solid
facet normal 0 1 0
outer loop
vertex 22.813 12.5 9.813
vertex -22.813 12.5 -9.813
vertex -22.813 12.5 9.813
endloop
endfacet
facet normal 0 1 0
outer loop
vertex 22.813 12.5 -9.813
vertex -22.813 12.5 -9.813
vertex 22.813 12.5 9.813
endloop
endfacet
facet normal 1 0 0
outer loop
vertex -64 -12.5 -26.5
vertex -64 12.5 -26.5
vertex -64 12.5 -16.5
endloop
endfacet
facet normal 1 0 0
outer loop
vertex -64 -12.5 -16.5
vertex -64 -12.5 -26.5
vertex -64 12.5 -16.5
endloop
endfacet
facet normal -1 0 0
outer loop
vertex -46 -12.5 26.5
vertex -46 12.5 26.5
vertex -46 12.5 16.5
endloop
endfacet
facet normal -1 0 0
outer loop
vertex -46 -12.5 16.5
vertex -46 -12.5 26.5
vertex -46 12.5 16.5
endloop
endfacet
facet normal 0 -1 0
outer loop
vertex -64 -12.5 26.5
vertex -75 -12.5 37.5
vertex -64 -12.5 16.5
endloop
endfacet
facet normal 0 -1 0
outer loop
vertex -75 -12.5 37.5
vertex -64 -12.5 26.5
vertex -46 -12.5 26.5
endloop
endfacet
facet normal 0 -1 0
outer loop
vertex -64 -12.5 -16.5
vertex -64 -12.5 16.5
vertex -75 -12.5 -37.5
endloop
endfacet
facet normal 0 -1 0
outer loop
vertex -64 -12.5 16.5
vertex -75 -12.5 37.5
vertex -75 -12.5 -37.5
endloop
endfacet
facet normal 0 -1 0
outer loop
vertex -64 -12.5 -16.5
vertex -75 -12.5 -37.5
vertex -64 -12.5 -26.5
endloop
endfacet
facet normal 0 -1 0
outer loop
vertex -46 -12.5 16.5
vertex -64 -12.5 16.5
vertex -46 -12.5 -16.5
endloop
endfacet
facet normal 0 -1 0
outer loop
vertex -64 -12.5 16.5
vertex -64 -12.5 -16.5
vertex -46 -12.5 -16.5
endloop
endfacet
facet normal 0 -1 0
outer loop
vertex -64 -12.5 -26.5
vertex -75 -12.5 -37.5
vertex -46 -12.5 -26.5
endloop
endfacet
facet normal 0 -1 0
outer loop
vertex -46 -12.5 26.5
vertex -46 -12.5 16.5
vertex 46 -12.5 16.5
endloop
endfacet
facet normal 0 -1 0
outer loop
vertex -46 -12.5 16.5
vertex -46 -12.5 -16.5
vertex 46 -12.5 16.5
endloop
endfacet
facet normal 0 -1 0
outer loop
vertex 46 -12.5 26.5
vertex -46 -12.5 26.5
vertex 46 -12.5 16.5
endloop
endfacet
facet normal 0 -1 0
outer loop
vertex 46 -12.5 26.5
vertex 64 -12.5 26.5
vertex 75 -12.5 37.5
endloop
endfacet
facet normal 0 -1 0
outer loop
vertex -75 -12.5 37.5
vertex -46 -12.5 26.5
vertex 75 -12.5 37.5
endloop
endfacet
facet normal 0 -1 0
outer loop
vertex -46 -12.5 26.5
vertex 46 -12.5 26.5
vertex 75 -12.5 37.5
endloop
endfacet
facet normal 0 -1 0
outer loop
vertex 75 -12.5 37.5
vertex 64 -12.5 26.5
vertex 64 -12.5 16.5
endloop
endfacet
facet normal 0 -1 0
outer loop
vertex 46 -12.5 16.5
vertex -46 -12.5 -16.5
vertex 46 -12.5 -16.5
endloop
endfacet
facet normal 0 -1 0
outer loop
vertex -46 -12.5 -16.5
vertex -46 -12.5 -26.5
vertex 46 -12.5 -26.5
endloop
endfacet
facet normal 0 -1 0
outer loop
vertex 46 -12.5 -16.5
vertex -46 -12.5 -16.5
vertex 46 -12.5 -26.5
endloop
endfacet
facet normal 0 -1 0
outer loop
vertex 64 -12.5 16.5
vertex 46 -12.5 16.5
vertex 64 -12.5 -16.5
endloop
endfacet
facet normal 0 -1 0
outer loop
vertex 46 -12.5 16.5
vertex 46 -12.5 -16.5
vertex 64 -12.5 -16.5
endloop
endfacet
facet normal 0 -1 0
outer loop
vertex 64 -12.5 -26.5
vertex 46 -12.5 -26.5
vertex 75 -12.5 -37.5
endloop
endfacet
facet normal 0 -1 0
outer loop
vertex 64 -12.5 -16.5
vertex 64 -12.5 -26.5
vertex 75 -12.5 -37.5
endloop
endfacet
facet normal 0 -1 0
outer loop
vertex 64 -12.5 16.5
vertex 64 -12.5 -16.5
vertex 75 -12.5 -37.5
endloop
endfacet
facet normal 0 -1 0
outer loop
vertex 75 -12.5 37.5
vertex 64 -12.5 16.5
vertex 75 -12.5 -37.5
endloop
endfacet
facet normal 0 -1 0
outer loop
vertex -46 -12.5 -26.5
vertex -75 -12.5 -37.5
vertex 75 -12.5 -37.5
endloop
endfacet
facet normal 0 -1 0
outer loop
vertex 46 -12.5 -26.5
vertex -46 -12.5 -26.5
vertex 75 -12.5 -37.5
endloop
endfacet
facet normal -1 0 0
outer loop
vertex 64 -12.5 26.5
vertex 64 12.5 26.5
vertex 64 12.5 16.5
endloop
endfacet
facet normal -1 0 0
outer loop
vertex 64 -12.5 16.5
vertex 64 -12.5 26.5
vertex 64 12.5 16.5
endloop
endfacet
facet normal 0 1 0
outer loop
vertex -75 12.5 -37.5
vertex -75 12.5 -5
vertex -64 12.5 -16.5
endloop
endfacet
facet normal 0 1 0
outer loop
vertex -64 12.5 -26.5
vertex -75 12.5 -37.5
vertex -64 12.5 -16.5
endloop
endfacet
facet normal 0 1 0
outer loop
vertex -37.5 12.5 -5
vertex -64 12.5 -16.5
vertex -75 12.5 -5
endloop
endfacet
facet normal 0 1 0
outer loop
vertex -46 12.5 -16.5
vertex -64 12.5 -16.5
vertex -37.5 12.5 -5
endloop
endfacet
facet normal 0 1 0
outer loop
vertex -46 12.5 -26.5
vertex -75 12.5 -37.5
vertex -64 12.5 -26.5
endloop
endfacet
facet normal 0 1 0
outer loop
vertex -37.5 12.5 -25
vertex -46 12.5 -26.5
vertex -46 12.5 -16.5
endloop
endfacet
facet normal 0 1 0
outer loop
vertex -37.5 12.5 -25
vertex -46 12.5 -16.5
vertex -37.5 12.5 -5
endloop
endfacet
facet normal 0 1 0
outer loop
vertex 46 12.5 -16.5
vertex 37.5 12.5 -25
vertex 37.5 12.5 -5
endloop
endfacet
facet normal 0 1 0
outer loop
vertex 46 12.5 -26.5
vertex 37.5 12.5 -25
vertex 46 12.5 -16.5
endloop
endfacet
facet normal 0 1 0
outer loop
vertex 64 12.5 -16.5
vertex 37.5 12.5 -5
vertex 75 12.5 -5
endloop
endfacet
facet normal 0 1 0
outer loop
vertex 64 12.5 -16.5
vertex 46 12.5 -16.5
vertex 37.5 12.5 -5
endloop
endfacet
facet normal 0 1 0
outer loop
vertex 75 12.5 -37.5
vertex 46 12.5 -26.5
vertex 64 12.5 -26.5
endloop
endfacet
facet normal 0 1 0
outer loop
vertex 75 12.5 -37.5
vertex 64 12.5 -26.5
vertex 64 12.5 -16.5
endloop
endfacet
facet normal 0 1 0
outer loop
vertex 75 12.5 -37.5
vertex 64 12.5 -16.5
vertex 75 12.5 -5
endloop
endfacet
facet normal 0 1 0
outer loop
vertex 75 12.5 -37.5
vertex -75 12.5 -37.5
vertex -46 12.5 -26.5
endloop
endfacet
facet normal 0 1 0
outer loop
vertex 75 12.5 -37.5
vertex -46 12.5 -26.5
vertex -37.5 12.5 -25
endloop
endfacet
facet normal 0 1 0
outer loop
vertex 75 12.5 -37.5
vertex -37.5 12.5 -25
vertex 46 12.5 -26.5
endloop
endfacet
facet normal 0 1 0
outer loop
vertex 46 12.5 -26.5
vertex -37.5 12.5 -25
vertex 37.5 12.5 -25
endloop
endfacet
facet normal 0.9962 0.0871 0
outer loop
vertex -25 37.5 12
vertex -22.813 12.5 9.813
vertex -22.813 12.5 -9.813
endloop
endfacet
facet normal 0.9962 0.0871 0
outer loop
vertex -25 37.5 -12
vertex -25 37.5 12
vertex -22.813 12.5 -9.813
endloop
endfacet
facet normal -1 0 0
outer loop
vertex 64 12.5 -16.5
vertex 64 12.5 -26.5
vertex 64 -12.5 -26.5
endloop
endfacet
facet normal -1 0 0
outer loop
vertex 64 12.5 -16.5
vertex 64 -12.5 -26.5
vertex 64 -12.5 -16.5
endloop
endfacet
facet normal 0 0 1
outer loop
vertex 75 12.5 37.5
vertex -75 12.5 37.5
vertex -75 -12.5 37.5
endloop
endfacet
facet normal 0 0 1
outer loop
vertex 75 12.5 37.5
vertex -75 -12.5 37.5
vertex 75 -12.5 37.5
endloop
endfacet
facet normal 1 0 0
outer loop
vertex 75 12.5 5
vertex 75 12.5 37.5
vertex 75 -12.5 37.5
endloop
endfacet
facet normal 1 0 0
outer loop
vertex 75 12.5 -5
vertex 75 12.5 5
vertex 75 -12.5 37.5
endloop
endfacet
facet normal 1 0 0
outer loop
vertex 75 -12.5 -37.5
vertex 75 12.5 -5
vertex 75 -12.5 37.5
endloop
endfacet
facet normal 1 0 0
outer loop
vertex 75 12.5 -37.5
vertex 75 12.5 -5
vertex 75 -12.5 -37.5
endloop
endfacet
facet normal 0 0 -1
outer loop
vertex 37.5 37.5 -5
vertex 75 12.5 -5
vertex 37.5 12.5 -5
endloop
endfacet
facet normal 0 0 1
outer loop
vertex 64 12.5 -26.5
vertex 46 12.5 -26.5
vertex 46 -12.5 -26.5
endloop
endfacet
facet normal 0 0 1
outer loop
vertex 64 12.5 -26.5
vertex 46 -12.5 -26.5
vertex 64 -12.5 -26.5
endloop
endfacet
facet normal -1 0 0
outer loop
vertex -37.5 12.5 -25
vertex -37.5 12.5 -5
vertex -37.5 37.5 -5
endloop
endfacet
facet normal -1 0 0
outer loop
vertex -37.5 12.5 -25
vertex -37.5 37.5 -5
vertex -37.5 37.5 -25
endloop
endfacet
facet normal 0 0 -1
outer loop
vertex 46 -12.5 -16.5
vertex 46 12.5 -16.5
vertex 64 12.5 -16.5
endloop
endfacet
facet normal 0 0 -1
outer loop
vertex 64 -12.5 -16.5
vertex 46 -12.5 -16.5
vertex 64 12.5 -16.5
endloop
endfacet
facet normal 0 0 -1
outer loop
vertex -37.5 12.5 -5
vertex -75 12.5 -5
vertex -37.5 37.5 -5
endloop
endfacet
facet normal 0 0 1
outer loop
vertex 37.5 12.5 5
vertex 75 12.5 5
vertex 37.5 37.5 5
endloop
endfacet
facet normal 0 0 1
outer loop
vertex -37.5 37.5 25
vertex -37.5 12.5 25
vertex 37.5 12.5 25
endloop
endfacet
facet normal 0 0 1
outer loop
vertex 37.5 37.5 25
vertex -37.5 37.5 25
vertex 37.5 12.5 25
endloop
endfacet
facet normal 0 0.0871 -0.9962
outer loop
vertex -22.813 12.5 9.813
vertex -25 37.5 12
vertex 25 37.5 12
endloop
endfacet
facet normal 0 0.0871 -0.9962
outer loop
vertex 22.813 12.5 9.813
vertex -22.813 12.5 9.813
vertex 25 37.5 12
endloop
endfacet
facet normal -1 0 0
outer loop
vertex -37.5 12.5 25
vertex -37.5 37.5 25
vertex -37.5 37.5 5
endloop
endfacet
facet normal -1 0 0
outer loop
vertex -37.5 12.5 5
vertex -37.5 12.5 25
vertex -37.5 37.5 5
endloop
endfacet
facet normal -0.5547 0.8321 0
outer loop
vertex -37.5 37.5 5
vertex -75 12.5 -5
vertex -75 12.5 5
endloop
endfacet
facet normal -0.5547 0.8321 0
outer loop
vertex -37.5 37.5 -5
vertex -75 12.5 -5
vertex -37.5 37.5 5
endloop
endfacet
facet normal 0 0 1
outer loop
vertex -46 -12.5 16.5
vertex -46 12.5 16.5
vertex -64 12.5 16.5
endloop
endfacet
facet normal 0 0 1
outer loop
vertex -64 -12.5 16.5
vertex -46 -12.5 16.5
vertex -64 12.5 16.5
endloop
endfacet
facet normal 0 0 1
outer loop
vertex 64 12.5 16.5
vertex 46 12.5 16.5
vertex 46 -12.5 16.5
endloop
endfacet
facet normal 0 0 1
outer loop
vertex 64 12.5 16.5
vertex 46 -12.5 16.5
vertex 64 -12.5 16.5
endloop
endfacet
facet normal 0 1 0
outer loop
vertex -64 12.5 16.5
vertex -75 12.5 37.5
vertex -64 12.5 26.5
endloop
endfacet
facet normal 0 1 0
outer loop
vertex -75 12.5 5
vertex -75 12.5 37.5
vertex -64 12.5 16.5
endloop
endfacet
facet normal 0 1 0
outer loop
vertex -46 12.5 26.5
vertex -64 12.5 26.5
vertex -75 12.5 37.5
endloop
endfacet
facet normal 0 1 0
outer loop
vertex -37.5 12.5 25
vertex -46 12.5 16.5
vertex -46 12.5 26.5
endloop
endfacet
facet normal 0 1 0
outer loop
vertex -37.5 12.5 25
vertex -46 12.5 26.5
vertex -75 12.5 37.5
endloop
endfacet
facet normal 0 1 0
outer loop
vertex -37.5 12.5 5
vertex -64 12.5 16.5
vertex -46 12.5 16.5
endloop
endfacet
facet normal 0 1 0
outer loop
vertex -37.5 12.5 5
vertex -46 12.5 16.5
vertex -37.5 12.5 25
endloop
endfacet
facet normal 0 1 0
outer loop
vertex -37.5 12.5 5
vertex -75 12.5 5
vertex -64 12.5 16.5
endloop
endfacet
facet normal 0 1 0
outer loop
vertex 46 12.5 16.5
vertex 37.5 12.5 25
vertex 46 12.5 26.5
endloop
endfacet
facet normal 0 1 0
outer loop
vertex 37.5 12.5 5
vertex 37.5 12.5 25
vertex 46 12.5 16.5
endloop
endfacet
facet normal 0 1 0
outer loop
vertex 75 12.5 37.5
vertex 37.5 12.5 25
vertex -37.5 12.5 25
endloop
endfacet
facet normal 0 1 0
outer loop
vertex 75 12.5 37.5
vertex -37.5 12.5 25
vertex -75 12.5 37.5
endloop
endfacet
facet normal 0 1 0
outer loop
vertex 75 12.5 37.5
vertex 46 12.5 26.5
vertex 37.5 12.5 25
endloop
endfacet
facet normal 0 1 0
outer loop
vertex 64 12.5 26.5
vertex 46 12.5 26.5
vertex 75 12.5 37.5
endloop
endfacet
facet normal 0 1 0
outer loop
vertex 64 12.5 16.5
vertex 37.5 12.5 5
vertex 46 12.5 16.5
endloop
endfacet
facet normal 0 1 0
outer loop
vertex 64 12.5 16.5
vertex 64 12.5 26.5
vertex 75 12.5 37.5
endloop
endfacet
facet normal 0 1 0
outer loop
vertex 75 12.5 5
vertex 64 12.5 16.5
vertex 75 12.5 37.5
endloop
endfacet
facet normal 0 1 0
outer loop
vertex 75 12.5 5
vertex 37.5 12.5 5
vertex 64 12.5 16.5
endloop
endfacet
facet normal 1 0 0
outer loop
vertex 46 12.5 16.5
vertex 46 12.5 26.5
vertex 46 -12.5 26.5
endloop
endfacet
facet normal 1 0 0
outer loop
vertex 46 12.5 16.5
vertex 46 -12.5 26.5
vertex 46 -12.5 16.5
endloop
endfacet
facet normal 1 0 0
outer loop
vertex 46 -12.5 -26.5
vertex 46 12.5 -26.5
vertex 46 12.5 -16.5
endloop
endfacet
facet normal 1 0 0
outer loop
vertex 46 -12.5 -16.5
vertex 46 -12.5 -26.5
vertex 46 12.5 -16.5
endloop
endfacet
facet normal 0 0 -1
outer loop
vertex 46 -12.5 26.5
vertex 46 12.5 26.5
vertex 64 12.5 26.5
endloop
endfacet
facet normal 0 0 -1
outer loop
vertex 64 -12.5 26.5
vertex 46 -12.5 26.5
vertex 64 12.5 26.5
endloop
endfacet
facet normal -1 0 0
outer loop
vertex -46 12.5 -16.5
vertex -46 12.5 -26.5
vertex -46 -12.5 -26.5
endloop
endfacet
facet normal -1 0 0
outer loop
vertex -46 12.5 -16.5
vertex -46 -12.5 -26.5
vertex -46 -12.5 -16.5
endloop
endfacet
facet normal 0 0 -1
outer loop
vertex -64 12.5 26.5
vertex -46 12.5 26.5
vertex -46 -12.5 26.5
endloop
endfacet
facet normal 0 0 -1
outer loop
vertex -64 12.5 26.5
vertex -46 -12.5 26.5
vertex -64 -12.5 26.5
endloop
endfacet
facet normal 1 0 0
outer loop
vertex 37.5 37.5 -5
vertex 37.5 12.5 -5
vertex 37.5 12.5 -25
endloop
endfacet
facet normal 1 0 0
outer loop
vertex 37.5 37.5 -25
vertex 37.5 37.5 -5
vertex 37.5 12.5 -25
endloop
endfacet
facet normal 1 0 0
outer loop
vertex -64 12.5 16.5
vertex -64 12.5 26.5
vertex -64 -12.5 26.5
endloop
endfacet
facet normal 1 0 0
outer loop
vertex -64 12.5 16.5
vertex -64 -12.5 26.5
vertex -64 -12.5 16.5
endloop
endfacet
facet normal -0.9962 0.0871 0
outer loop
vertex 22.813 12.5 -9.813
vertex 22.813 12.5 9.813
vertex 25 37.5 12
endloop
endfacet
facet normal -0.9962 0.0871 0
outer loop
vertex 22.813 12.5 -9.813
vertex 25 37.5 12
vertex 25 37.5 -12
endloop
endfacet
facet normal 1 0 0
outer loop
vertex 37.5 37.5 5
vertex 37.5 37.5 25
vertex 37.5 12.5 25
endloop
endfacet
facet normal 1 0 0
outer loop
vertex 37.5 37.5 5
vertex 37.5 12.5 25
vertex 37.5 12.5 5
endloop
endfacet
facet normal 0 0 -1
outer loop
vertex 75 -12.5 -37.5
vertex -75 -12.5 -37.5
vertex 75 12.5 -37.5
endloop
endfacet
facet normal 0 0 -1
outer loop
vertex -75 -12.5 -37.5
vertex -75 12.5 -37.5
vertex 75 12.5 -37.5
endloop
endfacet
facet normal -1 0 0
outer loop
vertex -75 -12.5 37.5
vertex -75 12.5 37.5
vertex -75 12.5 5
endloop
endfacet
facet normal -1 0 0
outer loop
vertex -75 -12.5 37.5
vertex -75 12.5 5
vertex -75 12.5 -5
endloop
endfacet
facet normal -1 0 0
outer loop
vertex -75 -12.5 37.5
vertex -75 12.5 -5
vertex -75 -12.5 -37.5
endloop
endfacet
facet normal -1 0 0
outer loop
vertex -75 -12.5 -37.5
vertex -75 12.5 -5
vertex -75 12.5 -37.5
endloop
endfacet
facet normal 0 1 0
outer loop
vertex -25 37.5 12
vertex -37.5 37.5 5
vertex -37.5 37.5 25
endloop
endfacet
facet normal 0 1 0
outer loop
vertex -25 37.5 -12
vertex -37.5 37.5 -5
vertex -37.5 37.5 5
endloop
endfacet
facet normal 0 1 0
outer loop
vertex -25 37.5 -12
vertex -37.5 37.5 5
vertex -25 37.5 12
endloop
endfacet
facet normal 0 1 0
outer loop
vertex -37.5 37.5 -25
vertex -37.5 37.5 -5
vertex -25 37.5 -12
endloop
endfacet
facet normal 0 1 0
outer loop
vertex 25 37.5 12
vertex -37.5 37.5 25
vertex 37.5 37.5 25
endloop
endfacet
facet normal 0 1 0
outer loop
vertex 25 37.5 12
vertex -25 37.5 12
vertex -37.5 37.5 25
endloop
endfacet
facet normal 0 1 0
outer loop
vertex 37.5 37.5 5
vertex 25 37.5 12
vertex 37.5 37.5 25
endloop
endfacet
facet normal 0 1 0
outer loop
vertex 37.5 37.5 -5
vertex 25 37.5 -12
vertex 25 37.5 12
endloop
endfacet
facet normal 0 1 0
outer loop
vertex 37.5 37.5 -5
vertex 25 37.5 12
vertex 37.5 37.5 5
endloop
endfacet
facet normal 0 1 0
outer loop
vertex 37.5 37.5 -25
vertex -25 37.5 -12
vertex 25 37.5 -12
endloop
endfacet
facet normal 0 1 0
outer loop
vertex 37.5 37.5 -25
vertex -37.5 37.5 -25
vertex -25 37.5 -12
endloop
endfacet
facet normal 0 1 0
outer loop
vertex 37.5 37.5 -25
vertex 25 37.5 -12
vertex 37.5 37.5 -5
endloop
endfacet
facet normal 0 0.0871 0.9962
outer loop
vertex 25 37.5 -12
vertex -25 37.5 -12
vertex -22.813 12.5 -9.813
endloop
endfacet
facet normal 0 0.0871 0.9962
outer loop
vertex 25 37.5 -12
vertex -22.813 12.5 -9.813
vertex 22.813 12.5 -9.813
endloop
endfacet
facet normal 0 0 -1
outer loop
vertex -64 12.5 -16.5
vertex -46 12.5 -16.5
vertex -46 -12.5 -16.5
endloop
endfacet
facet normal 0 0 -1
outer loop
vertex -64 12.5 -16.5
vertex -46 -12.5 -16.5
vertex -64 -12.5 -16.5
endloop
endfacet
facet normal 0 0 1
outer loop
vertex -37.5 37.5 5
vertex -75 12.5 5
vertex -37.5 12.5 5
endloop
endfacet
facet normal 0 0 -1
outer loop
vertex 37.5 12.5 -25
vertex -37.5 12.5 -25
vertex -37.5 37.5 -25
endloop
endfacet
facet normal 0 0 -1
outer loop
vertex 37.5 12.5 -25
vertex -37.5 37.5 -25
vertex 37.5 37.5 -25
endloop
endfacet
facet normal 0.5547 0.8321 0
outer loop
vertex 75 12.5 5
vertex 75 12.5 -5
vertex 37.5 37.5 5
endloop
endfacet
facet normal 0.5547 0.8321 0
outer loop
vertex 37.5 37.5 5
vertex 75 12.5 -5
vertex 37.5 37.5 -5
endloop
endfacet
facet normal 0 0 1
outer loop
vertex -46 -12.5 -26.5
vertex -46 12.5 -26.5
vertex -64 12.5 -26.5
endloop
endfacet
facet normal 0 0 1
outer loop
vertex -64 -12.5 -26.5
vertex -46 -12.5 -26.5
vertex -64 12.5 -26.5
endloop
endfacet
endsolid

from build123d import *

# Parameters (mm, degrees)
SKETCH2_W               = 150
SKETCH2_H               = 75
BOSS_EXTRUDE1_DEPTH     = 12.5
SKETCH3_W               = 75
SKETCH3_H               = 50
BOSS_EXTRUDE3_DEPTH     = 25
SKETCH4_W               = 50
SKETCH4_H               = 24
CUT_EXTRUDE1_DEPTH      = 25
CUT_EXTRUDE1_DRAFT      = -5
SKETCH5_W               = 18
SKETCH5_H               = 10
CUT_EXTRUDE2_DEPTH      = 88.5
MIRROR2_COPY_1_SKETCH_W = 18
MIRROR2_COPY_1_SKETCH_H = 10
MIRROR2_COPY_1_DEPTH    = 88.5
RIB1_REACH              = 93.856
SKETCH6_WALL_W          = 230.781121652
SKETCH6_WALL_H          = 10


with BuildPart() as part:
    # Sketch2 → Boss-Extrude1 (new, symmetric)
    with BuildSketch(Plane(origin=(0, 0, 0), x_dir=(1, 0, 0), z_dir=(0, 1, 0))):
        Rectangle(SKETCH2_W, SKETCH2_H)
    extrude(amount=BOSS_EXTRUDE1_DEPTH, both=True)

    # Sketch3 → Boss-Extrude3 (add)
    with BuildSketch(Plane(origin=(0, 12.5, 0), x_dir=(1, 0, 0), z_dir=(0, 1, 0))):
        Rectangle(SKETCH3_W, SKETCH3_H)
    extrude(amount=BOSS_EXTRUDE3_DEPTH)


with BuildPart() as cut_extrude1_tool:
    # Sketch4 → Cut-Extrude1 (with draft: the straight prism first)
    with BuildSketch(Plane(origin=(0, 37.5, 0), x_dir=(1, 0, 0), z_dir=(0, 1, 0))):
        Rectangle(SKETCH4_W, SKETCH4_H)
    extrude(amount=-CUT_EXTRUDE1_DEPTH)
    # Cut-Extrude1: the draft: its side faces are tilted about the plane it starts from
    cut_extrude1_sides = [cut_extrude1_tool.faces().sort_by_distance(p)[0] for p in [
        (-25, 25, 0),
        (0, 25, 12),
        (25, 25, 0),
        (0, 25, -12),
    ]]
    draft(cut_extrude1_sides, Plane(origin=(0, 37.5, 0), x_dir=(1, 0, 0), z_dir=(0, 1, 0)), CUT_EXTRUDE1_DRAFT)


with BuildPart() as part_1:
    add(part.part)

    # Cut-Extrude1: cut by cut_extrude1_tool
    add(cut_extrude1_tool.part, mode=Mode.SUBTRACT)

    # Sketch5 → Cut-Extrude2 (cut, through all)
    with BuildSketch(Plane(origin=(0, 12.5, 0), x_dir=(1, 0, 0), z_dir=(0, 1, 0))):
        with Locations((55, -21.5)):
            Rectangle(SKETCH5_W, SKETCH5_H)
    cut_extrude2 = extrude(amount=-CUT_EXTRUDE2_DEPTH, mode=Mode.SUBTRACT)

    # Mirror1: Cut-Extrude2 across plane
    add(cut_extrude2.mirror(Plane(origin=(0, 0, 0), x_dir=(0, 0, 1), z_dir=(1, 0, 0))), mode=Mode.SUBTRACT)

    # Mirror2: Cut-Extrude2 across plane
    add(cut_extrude2.mirror(Plane.XY), mode=Mode.SUBTRACT)

    # Mirror2 copy 1 sketch → Mirror2 copy 1 (cut, through all)
    with BuildSketch(Plane(origin=(0, 12.5, 0), x_dir=(-1, 0, 0), z_dir=(0, 1, 0))):
        with Locations((55, -21.5)):
            Rectangle(MIRROR2_COPY_1_SKETCH_W, MIRROR2_COPY_1_SKETCH_H)
    extrude(amount=-MIRROR2_COPY_1_DEPTH, mode=Mode.SUBTRACT)

    # Sketch6 wall → Rib1 (add, up to next)
    with BuildSketch(Plane(origin=(-56.25, 25, 0), x_dir=(0.832050294338, 0.554700196225, 0), z_dir=(-0.554700196225, 0.832050294338, 0)), mode=Mode.PRIVATE) as rib1_sk1:
        Rectangle(SKETCH6_WALL_W, SKETCH6_WALL_H)
    rib1_tool1 = extrude(rib1_sk1.sketch, amount=-RIB1_REACH, mode=Mode.PRIVATE) - part_1.part
    rib1 = rib1_tool1.solids().sort_by_distance((-56.25, 25, 0))[0]
    add(rib1)

    # Mirror3: Rib1 across plane
    add(rib1.mirror(Plane(origin=(0, 0, 0), x_dir=(0, 0, 1), z_dir=(1, 0, 0))))


solid = part_1.part
